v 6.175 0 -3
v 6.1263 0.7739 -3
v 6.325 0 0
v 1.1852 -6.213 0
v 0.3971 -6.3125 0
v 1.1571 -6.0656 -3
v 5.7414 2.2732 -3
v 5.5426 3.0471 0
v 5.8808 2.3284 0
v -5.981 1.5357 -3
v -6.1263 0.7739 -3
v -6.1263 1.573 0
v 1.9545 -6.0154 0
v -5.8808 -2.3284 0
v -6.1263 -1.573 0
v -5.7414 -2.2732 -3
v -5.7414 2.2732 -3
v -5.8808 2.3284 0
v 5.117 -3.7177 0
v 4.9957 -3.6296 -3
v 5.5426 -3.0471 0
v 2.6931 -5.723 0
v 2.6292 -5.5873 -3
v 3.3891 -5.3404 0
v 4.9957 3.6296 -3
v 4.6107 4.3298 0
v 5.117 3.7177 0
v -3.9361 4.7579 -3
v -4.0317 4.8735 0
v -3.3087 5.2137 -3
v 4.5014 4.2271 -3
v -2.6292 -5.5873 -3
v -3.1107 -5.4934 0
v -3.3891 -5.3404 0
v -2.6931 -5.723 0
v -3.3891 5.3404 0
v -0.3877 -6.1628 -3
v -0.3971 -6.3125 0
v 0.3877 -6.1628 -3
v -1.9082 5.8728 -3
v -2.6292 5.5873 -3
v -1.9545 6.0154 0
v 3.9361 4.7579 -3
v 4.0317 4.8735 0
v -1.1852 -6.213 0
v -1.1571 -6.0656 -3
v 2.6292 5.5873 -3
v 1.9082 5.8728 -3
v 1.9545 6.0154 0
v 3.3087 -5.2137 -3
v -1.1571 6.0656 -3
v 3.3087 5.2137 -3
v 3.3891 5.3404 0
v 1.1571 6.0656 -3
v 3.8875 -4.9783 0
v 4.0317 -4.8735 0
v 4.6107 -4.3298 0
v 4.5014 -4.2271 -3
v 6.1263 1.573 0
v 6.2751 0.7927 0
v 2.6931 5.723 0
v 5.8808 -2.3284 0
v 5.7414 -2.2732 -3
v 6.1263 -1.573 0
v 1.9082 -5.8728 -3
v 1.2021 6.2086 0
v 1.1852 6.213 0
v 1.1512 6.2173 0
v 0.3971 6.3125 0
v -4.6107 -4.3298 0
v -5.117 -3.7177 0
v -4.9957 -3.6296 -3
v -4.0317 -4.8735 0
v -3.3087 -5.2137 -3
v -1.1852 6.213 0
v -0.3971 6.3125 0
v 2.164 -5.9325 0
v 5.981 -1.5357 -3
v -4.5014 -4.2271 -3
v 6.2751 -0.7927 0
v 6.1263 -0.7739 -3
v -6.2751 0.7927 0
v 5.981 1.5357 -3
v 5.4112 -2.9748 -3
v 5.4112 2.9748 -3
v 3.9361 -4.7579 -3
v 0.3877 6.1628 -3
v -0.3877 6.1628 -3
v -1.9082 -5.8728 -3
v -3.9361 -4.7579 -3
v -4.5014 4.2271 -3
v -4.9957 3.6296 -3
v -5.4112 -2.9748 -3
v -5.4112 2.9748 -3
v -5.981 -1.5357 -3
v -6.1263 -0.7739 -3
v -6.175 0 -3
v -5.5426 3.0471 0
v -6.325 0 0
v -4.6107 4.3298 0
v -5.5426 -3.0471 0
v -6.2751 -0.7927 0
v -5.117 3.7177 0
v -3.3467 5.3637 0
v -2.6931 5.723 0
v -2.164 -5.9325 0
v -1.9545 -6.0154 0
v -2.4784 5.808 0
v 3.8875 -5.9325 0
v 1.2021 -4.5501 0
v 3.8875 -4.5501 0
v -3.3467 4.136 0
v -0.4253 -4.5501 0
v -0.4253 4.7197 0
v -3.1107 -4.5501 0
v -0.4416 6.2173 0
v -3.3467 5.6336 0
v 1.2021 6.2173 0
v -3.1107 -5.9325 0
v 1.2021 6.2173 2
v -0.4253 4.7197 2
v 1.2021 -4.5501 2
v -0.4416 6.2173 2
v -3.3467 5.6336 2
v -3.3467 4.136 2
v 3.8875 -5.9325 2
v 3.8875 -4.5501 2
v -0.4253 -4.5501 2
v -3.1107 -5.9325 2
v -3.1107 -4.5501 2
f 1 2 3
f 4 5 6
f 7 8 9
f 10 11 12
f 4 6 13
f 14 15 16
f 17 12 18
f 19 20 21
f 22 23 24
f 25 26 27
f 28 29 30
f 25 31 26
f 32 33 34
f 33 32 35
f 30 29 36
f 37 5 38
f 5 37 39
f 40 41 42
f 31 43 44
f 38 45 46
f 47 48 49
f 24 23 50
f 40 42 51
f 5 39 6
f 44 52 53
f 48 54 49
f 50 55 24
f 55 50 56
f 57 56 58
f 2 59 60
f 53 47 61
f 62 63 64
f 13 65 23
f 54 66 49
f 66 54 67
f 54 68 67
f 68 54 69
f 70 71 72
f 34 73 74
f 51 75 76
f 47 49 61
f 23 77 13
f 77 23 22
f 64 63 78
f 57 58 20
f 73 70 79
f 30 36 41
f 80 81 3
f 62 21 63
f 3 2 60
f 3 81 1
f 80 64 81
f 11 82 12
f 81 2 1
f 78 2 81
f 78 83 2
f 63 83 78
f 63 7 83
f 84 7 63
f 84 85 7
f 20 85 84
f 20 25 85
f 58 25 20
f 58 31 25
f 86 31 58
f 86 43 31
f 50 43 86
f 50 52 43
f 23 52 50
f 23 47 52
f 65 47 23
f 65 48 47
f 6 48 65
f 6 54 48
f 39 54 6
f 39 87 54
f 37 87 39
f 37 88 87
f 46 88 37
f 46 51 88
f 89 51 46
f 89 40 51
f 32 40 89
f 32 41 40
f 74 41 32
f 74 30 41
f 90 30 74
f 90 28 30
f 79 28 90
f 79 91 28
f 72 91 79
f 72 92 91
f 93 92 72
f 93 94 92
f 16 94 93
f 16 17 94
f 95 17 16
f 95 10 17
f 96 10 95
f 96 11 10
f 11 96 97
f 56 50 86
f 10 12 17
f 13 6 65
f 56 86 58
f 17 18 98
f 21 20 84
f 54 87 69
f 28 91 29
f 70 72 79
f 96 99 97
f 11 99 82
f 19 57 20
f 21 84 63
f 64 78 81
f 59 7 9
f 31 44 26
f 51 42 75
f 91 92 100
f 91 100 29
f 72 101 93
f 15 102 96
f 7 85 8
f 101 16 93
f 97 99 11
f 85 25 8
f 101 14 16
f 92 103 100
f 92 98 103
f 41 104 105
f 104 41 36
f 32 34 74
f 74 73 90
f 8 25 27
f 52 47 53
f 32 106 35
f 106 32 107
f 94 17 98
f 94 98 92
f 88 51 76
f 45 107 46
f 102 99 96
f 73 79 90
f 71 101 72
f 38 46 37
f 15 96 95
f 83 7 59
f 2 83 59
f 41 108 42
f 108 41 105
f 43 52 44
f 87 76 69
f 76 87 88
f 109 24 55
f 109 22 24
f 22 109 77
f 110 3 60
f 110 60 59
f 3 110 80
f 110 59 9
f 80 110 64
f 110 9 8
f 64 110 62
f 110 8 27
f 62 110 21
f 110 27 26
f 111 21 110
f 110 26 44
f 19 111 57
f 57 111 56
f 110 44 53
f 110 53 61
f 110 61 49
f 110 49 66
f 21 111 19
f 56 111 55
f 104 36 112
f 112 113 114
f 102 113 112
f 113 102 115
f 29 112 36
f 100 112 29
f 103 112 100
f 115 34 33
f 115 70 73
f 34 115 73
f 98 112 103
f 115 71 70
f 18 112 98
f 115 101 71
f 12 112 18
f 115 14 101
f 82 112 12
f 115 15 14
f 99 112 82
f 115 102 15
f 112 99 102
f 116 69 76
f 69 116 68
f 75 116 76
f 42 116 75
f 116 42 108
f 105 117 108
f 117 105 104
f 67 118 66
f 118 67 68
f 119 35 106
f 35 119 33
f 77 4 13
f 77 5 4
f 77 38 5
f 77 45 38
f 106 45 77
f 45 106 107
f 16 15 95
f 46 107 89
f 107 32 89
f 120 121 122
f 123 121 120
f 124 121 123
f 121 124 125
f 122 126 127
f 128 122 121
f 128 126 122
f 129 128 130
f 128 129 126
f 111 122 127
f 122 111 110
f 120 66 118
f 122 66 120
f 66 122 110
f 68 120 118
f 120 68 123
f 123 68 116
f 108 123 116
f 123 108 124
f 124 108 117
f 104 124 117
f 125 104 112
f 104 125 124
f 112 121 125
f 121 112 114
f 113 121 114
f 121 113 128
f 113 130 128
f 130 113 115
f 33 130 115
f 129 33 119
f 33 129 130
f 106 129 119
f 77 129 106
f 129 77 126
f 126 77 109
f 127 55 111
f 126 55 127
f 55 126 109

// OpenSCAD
$fn = 50;

difference() {
	union() {
		translate(v = [0, 0, -3.0]) {
			cylinder(h = 3, r1 = 6.175, r2 = 6.325);
		}
		linear_extrude(height = 2) {
			text(font = "Impact", halign = "center", size = 12, text = "1", valign = "center");
		}
	}
	union();
}
